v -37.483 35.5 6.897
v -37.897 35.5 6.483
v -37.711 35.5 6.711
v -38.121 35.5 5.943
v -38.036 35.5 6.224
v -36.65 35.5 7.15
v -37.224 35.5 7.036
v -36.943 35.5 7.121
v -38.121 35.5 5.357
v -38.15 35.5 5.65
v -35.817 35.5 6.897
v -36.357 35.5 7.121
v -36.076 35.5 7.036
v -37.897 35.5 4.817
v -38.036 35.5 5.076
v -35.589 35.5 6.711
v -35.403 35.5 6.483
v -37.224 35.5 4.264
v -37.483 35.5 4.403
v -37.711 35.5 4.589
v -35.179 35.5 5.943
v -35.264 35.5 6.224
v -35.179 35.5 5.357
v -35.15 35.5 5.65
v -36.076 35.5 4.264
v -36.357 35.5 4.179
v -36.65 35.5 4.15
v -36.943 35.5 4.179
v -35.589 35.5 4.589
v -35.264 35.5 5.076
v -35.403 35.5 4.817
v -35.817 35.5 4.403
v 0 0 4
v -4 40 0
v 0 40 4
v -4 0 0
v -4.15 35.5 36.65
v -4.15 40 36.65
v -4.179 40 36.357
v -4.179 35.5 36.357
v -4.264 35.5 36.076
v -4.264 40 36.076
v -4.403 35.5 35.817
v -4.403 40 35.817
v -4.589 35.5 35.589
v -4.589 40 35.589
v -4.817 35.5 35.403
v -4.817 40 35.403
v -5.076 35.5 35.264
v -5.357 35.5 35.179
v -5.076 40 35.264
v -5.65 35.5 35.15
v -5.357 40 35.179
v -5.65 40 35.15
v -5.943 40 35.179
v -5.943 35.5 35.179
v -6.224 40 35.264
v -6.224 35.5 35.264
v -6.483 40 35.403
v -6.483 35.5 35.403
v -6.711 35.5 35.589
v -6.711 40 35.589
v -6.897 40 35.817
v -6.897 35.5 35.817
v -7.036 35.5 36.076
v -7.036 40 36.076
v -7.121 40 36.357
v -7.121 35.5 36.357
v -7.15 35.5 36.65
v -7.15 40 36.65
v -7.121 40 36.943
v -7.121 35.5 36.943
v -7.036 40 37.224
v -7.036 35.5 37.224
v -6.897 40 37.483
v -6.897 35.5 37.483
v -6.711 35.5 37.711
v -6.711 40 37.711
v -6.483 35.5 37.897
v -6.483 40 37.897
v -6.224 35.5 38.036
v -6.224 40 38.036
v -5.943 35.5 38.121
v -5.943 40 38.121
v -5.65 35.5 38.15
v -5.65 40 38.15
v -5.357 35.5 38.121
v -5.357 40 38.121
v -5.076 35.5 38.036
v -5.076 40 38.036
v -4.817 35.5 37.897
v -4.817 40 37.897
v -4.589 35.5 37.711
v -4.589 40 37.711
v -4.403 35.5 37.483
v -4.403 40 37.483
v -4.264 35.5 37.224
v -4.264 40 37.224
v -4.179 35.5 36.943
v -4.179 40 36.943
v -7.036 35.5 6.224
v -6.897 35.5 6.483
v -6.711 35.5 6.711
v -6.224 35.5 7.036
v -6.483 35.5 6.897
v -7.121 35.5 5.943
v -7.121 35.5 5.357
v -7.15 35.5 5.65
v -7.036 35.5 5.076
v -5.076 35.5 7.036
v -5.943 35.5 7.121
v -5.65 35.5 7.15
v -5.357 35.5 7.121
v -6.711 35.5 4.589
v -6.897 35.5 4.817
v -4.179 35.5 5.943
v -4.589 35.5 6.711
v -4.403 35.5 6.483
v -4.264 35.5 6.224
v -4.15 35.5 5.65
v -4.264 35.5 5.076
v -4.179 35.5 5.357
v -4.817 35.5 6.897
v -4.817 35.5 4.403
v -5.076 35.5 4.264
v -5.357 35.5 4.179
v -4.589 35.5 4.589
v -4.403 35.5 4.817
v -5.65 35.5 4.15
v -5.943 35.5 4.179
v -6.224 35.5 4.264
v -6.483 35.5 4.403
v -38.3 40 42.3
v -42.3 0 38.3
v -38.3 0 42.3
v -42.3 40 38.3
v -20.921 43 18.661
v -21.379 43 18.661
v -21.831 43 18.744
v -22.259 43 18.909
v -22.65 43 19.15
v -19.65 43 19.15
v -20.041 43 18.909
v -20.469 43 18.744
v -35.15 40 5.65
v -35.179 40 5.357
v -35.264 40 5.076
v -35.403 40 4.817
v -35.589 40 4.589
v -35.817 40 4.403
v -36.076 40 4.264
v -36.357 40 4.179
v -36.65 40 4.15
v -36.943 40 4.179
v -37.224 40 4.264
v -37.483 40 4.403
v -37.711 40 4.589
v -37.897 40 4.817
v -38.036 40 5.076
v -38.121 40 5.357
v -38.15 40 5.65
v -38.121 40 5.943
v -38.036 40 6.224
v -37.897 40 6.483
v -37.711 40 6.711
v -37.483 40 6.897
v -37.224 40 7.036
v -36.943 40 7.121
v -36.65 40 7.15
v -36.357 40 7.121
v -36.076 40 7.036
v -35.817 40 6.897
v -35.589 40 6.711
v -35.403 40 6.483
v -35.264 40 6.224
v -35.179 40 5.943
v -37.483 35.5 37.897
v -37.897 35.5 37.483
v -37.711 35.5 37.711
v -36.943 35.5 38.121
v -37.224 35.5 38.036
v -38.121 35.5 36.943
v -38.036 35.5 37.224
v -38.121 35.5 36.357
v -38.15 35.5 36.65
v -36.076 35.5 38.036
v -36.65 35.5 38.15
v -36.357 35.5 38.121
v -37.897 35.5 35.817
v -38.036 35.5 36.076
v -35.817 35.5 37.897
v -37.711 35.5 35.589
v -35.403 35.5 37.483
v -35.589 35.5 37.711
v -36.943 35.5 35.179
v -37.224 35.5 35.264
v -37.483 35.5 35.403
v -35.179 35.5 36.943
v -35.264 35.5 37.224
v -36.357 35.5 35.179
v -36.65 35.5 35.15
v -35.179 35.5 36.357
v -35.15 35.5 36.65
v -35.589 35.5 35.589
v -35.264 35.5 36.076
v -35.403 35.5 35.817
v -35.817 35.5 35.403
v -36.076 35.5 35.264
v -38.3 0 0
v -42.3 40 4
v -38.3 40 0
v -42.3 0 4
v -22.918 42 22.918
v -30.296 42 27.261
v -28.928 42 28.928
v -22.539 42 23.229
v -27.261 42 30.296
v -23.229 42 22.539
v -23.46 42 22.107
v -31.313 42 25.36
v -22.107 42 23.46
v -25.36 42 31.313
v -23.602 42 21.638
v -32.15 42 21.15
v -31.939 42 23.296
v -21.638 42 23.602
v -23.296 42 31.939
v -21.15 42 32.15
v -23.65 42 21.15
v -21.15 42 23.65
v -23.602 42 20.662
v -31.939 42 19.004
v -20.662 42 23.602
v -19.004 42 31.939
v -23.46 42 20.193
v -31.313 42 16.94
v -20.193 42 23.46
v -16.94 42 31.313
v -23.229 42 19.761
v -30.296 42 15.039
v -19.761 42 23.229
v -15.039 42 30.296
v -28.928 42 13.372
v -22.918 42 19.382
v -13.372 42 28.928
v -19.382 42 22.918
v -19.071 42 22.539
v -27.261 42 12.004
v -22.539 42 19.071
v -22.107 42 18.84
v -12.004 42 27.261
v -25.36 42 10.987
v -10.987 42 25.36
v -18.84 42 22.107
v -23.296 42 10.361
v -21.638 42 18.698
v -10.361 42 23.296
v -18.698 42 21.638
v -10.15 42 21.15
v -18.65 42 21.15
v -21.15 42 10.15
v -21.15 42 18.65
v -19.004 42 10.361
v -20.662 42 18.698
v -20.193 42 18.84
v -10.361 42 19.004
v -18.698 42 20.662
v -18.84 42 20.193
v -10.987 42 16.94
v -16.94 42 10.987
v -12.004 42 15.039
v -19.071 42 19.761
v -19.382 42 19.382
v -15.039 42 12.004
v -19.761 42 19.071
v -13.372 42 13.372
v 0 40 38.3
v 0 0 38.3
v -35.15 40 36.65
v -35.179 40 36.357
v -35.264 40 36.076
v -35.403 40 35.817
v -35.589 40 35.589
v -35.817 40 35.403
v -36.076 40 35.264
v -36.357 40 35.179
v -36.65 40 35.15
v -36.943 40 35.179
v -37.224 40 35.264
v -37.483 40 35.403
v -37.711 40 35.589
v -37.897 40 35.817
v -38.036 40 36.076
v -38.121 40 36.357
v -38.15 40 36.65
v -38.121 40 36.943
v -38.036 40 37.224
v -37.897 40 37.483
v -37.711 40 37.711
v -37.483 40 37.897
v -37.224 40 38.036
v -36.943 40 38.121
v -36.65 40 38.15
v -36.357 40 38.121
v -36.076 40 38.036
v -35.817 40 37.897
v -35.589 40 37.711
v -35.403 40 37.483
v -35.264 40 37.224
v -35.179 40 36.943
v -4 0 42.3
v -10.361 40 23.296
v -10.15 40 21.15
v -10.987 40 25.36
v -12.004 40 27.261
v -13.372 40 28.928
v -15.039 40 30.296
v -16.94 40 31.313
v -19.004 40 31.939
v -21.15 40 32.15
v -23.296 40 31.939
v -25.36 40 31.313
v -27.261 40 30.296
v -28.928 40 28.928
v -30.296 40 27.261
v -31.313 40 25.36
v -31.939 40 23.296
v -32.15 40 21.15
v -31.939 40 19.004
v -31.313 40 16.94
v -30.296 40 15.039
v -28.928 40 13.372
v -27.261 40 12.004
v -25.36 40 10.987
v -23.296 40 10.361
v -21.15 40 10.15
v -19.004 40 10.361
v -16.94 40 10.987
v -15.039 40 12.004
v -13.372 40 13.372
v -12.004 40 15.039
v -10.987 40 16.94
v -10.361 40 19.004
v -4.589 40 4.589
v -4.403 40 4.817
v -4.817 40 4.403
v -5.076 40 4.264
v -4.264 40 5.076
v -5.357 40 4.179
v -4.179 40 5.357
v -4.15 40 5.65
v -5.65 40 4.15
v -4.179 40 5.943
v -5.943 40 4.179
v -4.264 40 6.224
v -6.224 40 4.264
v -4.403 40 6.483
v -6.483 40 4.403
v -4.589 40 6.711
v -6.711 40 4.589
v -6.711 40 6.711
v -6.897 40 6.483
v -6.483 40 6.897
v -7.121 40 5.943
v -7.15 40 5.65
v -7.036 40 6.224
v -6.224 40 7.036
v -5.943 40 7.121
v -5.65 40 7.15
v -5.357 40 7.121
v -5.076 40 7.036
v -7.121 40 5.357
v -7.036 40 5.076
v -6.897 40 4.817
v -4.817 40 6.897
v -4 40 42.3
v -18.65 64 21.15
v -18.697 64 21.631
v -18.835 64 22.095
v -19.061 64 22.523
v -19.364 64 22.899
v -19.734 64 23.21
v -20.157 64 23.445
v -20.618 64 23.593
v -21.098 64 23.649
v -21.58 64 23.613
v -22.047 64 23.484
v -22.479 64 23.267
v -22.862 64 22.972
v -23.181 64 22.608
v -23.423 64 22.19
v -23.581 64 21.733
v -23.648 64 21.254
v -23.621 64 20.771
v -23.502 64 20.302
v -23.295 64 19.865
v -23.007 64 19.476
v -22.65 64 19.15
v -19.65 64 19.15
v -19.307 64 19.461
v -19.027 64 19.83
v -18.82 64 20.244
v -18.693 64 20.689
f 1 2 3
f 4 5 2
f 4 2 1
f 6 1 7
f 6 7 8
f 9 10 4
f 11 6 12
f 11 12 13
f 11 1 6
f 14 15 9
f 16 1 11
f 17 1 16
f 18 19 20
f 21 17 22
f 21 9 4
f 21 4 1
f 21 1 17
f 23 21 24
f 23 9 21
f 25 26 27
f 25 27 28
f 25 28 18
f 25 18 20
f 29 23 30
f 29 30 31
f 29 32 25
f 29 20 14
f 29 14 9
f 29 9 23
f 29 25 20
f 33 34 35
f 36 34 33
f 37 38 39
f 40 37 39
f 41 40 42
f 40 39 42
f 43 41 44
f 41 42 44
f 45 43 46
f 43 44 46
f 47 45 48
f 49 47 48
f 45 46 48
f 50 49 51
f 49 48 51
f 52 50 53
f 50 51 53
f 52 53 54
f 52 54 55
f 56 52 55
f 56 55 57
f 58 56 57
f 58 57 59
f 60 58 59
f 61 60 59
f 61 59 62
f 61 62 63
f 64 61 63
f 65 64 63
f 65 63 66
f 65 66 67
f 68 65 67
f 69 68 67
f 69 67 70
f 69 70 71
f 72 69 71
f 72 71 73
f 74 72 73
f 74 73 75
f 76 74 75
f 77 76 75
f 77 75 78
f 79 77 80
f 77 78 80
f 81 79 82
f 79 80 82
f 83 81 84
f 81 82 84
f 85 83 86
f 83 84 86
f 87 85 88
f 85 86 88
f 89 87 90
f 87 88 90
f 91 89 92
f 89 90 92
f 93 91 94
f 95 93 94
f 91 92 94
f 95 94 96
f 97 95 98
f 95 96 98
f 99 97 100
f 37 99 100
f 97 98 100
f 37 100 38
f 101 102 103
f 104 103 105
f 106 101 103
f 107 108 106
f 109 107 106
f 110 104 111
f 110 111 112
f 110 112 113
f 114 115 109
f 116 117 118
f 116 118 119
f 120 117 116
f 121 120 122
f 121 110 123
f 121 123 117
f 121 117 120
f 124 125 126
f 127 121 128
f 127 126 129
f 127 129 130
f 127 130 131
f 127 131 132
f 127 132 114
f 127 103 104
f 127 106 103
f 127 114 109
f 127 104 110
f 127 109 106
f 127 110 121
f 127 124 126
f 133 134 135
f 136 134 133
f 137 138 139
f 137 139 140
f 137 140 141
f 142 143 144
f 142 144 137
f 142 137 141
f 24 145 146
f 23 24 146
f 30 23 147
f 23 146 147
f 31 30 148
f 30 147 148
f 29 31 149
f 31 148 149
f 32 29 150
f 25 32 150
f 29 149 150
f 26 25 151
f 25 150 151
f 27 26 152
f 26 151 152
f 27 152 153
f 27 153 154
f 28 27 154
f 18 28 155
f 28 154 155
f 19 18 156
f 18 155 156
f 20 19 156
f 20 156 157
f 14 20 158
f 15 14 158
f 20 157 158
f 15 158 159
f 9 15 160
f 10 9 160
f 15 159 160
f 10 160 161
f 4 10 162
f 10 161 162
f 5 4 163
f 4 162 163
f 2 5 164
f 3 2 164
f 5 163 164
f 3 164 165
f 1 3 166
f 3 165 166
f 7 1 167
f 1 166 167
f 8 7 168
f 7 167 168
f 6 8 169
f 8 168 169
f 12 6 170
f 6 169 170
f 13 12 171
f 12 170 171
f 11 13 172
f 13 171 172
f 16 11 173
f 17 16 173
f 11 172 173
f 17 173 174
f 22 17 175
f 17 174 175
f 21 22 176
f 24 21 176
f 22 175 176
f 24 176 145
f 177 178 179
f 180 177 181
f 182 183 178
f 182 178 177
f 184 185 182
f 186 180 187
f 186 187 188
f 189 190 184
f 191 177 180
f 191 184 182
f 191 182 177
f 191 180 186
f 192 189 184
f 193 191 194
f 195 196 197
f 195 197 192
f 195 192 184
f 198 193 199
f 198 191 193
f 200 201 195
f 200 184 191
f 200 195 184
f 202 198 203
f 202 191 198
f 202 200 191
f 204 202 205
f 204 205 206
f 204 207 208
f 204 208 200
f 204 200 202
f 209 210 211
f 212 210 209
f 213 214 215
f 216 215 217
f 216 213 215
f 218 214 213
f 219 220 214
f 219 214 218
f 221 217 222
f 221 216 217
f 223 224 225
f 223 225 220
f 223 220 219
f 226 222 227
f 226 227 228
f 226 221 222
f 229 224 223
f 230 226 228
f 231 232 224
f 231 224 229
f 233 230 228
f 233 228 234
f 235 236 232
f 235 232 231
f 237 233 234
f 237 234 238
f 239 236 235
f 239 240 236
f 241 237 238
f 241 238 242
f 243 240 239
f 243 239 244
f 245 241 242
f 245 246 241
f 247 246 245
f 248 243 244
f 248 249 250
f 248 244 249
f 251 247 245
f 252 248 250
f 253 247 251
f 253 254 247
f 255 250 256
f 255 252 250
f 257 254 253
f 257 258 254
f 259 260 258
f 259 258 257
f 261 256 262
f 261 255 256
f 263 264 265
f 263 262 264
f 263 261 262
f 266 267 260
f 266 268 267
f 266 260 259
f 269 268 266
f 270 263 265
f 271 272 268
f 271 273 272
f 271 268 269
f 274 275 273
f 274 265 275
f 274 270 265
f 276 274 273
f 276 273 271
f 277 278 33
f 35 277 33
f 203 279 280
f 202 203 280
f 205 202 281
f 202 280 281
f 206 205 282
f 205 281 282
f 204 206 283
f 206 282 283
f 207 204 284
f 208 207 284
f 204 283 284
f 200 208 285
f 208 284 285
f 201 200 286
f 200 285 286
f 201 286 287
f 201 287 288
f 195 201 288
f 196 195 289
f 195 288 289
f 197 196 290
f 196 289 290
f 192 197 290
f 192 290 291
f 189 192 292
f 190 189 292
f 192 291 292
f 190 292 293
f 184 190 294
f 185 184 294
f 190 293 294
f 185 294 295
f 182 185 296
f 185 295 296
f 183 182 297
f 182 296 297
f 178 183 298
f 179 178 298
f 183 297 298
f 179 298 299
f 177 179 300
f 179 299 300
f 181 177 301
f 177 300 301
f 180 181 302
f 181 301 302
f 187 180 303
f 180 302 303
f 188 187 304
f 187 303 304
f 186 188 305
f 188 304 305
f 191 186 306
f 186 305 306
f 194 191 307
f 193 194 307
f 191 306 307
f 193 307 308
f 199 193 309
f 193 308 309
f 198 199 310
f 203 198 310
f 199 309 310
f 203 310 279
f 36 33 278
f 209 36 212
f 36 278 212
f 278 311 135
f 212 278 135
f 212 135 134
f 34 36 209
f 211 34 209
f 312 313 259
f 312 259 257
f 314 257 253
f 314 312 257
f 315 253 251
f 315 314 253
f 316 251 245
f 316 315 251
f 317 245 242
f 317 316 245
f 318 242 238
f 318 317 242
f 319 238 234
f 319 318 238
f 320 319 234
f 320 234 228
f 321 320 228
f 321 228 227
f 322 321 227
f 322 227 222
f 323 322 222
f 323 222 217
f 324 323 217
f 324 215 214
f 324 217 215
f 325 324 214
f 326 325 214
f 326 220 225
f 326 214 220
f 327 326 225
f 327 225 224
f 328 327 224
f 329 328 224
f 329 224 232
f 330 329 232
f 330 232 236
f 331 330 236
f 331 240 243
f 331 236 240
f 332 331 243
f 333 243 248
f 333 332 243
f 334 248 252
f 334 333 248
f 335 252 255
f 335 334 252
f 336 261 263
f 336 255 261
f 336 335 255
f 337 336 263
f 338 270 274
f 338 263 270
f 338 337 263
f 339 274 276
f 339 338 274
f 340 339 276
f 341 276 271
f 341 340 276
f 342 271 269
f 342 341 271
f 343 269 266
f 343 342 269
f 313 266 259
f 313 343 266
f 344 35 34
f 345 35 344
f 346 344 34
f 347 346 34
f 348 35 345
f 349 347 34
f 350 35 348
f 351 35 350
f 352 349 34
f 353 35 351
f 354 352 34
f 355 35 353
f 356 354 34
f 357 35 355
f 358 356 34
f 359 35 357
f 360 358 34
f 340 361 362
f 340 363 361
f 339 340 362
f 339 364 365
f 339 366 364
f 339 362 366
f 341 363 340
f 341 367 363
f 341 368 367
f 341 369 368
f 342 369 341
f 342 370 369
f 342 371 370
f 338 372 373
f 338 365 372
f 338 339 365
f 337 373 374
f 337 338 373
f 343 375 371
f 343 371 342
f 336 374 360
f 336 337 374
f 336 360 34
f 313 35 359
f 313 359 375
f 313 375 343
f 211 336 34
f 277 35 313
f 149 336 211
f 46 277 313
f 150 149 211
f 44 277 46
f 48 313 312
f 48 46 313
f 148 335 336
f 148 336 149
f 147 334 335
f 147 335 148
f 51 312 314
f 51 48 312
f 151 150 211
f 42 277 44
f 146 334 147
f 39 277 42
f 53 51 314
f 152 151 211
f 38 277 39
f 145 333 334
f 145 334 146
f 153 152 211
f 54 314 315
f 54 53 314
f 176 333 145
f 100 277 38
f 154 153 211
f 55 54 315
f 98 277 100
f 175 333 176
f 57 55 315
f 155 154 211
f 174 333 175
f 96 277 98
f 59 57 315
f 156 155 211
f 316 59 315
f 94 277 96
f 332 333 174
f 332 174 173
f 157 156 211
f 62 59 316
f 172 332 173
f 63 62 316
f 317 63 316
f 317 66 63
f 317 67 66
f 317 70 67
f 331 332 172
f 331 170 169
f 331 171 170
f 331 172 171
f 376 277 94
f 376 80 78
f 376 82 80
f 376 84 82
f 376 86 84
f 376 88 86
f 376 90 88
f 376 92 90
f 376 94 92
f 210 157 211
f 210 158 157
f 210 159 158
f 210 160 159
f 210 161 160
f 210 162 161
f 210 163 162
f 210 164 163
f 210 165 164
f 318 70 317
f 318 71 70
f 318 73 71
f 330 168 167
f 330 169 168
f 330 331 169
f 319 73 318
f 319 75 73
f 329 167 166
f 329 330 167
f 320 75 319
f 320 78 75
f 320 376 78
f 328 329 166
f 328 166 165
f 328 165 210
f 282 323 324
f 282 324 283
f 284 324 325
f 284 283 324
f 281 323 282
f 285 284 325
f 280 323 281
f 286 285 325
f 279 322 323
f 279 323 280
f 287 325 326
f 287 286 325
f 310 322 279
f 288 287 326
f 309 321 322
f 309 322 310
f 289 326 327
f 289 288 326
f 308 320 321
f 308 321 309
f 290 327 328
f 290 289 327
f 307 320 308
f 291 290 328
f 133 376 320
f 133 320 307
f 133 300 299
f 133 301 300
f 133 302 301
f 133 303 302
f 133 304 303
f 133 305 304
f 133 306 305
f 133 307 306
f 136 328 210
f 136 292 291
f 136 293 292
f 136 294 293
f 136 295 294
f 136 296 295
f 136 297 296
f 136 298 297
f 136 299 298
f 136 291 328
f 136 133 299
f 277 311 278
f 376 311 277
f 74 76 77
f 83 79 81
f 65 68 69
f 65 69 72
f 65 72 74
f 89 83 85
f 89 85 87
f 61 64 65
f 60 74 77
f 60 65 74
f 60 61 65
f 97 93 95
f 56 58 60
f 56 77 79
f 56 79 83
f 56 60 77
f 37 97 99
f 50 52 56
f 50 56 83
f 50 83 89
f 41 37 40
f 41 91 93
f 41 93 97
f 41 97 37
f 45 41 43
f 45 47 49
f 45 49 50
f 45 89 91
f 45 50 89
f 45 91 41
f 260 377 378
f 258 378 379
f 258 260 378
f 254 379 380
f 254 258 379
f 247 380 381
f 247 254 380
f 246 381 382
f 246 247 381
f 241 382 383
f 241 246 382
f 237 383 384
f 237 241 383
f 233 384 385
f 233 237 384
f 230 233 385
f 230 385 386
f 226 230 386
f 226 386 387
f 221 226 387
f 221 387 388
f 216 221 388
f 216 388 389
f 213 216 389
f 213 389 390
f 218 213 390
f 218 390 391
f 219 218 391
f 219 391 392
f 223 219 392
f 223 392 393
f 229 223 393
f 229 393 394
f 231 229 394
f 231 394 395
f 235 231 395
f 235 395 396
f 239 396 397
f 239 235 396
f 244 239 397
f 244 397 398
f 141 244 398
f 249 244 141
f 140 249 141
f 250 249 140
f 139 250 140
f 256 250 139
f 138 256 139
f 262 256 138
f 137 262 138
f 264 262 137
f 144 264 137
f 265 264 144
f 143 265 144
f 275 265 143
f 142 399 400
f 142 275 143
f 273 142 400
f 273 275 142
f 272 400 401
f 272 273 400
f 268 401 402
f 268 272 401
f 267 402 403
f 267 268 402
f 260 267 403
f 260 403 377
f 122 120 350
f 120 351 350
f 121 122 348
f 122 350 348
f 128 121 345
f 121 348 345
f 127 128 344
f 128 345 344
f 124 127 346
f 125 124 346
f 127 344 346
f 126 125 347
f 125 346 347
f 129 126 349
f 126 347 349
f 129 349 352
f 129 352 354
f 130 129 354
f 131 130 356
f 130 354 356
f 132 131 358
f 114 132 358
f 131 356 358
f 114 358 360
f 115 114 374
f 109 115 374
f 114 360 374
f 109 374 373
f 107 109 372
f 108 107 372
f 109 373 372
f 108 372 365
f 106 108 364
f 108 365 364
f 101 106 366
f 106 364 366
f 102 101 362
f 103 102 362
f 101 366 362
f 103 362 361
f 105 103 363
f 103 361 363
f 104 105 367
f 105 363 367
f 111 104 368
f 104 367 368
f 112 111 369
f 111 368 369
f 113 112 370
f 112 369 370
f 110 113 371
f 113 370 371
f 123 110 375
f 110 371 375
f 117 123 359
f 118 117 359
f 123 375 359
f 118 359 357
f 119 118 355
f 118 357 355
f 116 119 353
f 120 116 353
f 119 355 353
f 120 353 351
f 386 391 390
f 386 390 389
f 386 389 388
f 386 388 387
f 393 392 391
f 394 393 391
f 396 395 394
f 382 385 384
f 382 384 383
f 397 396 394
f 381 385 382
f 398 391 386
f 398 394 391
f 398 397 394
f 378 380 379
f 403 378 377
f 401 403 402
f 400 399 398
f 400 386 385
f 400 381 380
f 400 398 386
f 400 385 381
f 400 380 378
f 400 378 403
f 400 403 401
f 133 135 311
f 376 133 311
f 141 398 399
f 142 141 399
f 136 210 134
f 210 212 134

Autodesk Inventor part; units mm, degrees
ref_plane "YZ Plane" through (0, 0, 0) normal (1, 0, 0) x (0, 1, 0)
ref_plane "XZ Plane" through (0, 0, 0) normal (0, 1, 0) x (-1, 0, 0)
ref_plane "XY Plane" through (0, 0, 0) normal (0, 0, 1) x (1, 0, 0)
sketch "Sketch1" plane through (0, 0, 0) normal (0, 1, 0) x (-1, 0, 0)
  line L0 (0, 0) -> (42.3, 0)
  line L1 (42.3, 0) -> (42.3, 42.3)
  line L2 (42.3, 42.3) -> (0, 42.3)
  line L3 (0, 42.3) -> (0, 0)
  dimension "d0" = 42.3
  dimension "d1" = 42.3
extrude "Extrusion1" add sketch "Sketch1" along normal blind 40
sketch "Sketch2" plane through (0, 40, 0) normal (0, 1, 0) x (1, 0, 0)
  line L0 (0, 0) -> (-42.3, 0) projected
  line L1 (0, -42.3) -> (0, 0) projected
  circle A0 centre (-21.15, -21.15) radius 11
  point P0 (0, -2)
  point P1 (-2, 0)
  point P2 (-40.3, 0)
  point P3 (0, -40.3)
  dimension "d6" = 22
  dimension "d7" = 21.15
  dimension "d8" = 21.15
extrude "Extrusion2" add sketch "Sketch2" along normal blind 2
sketch "Sketch3" plane through (-21.15, 42, 21.15) normal (0, 1, 0) x (1, 0, 0)
  circle A0 centre (0, 0) radius 11 projected
  circle A1 centre (0, 0) radius 2.5
  point P0 (21.15, 21.15)
  dimension "d11" = 5
extrude "Extrusion3" add sketch "Sketch3" along normal blind 22 contours A1
sketch "Sketch4" plane through (-21.15, 64, 21.15) normal (0, 1, 0) x (1, 0, 0)
  circle A0 centre (0, 0) radius 2.5 projected
  line L0 (-1.5, 2) -> (1.5, 2)
  point P0 (21.15, 21.15)
  dimension "d14" = 2
extrude "Extrusion4" cut sketch "Sketch4" against normal blind 21 contours L0 A0 picked at (-0.3466, 2.0912)
sketch "Sketch5" plane through (0, 40, 0) normal (0, 1, 0) x (1, 0, 0)
  line L0 (-42.3, 0) -> (-42.3, -42.3) projected
  line L1 (-42.3, -42.3) -> (0, -42.3) projected
  circle A0 centre (-36.65, -5.65) radius 1.5
  circle A1 centre (-5.65, -5.65) radius 1.5
  circle A2 centre (-5.65, -36.65) radius 1.5
  circle A3 centre (-36.65, -36.65) radius 1.5
  point P0 (-42.3, -2)
  point P1 (-42.3, -40.3)
  point P2 (-40.3, -42.3)
  point P3 (-2, -42.3)
  point P4 (0, 0)
  dimension "d17" = 3
  dimension "d18" = 3
  dimension "d19" = 3
  dimension "d20" = 3
  dimension "d21" = 31
  dimension "d22" = 5.65
  dimension "d23" = 31
  dimension "d24" = 5.65
extrude "Extrusion5" cut sketch "Sketch5" against normal blind 4.5
chamfer "Chamfer1" distance 4 angle 45 4 edges at (-42.3, 20, 0) (-42.3, 20, 42.3) (0, 20, 0) (0, 20, 42.3)
properties part number "StepperMotorNema17x40mm"
